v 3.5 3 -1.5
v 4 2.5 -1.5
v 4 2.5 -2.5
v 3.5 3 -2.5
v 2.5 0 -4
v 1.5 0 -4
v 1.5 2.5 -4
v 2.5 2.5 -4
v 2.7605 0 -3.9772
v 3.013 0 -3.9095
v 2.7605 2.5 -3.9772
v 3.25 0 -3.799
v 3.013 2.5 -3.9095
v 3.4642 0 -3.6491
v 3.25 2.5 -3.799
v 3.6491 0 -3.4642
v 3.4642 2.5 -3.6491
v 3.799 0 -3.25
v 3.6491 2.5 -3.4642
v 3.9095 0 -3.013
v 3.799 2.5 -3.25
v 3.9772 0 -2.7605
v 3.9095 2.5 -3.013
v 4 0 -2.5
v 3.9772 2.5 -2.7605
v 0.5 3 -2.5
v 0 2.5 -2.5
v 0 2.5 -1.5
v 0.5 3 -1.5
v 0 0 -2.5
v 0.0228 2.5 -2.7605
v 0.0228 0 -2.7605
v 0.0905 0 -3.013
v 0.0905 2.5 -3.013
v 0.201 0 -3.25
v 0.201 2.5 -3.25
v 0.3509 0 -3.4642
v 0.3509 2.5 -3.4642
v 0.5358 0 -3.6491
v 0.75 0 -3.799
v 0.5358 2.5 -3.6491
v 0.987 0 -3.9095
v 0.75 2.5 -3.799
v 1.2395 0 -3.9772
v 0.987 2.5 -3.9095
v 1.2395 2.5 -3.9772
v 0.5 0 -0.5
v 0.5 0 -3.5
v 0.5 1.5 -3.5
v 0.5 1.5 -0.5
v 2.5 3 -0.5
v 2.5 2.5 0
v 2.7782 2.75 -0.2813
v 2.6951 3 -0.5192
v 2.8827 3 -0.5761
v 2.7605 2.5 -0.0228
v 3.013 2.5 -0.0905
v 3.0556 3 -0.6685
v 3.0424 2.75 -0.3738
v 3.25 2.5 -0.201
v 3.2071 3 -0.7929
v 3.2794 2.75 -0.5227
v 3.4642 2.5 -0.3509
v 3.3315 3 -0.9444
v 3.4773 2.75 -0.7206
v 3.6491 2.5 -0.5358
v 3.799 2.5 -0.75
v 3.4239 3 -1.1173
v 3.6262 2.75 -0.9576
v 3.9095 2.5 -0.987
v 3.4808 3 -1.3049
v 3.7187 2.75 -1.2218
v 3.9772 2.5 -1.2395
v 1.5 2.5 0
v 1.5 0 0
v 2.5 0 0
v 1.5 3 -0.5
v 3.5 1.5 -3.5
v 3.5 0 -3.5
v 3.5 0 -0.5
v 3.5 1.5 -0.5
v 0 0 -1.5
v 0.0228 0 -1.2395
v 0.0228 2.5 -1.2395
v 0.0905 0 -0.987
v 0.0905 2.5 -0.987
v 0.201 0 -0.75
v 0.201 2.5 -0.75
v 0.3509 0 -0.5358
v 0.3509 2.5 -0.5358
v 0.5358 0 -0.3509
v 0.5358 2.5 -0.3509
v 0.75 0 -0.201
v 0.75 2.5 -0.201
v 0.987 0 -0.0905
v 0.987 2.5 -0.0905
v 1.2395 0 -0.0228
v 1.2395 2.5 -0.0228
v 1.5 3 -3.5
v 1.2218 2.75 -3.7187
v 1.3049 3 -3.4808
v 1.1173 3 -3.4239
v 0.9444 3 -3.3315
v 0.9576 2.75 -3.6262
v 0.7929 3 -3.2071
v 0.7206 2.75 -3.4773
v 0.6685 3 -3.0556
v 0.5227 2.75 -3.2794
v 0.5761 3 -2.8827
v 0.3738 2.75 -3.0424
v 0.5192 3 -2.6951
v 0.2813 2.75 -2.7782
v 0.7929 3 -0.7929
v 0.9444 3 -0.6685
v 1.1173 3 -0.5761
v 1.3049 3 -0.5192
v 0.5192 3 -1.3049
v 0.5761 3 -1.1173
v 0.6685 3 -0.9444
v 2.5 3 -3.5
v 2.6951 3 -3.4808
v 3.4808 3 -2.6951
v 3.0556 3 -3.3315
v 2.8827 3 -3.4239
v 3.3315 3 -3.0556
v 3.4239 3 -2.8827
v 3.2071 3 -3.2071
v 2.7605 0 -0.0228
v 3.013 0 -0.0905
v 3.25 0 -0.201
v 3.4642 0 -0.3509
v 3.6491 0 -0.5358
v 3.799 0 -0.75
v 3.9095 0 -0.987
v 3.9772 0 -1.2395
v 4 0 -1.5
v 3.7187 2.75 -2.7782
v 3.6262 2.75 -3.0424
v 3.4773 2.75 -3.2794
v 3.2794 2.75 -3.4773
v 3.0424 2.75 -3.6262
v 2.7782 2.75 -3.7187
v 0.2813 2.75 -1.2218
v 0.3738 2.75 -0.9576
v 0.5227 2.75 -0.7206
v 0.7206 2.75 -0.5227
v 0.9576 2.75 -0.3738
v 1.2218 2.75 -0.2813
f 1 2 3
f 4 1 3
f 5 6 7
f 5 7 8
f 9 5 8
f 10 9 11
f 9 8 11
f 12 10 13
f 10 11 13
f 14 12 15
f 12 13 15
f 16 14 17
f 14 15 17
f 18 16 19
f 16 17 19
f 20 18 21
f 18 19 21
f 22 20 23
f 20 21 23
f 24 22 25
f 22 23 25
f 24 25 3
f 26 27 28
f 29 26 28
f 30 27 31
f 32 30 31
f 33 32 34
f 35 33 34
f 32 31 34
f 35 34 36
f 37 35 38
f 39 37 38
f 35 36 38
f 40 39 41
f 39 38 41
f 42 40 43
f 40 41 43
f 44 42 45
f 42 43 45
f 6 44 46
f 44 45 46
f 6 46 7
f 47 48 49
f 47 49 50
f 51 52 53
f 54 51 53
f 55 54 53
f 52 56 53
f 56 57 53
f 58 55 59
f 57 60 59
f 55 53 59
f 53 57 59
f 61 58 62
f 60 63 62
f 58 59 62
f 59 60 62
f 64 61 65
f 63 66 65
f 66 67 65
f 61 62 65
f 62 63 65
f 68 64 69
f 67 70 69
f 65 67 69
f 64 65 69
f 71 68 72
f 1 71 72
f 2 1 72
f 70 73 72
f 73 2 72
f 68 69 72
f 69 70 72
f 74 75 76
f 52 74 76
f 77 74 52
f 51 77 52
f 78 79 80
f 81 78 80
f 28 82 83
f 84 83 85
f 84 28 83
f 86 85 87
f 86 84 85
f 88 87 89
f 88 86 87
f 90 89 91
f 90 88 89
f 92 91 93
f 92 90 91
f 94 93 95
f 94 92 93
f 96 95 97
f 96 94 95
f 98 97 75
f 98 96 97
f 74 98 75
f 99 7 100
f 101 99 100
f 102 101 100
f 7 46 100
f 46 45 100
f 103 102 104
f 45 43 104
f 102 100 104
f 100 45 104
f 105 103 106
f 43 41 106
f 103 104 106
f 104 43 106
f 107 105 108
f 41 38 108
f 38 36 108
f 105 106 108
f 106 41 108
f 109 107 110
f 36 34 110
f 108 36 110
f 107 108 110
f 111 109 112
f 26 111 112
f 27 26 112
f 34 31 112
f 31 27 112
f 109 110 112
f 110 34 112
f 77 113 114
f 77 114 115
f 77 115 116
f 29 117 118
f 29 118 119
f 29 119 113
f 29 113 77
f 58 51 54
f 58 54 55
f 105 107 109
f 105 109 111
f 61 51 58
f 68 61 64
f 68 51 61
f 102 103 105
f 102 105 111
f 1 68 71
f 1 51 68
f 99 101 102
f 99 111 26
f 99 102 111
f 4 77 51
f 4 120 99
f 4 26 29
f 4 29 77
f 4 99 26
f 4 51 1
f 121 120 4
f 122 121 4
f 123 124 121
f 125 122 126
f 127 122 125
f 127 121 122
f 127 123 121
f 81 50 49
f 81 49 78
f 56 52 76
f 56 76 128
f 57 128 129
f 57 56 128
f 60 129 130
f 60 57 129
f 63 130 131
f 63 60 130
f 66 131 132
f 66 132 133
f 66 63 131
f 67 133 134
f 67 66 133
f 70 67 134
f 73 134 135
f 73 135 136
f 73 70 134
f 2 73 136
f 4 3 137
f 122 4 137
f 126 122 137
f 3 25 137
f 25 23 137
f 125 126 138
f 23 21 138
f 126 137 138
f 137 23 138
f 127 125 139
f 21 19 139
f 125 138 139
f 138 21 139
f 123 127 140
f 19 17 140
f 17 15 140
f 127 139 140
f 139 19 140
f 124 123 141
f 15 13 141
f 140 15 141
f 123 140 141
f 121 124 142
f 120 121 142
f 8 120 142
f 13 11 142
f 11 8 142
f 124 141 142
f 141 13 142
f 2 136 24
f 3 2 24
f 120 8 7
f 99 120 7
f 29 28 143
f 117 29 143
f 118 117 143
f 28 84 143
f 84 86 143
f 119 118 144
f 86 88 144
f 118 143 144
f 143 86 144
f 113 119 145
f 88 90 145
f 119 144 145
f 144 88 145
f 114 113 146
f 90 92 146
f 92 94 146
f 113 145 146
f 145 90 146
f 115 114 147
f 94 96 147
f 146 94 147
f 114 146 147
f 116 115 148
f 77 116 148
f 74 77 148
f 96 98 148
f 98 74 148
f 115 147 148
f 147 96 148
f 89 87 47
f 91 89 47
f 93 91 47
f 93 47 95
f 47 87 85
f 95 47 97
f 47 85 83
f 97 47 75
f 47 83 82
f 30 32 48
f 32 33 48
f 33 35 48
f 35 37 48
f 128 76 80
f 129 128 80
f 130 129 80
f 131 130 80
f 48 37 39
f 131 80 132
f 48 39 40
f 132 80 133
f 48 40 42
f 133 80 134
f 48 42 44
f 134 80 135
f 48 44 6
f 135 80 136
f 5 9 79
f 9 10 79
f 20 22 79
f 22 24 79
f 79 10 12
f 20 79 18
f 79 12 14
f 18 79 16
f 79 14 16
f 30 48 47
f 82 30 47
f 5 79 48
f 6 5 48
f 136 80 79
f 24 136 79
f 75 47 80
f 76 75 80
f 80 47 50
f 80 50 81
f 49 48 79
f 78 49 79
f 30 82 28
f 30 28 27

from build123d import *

# Parameters (mm, degrees)
CROQUIS1_W              = 4
CROQUIS1_H              = 4
SALIENTE_EXTRUIR1_DEPTH = 3
CROQUIS2_W              = 3
CROQUIS2_H              = 3
CORTAR_EXTRUIR1_DEPTH   = 1.5
REDONDEO1_R             = 1.5
CHAFL_N1_SIZE           = 0.5


with BuildPart() as part:
    # Croquis1 → Saliente-Extruir1 (new body)
    with BuildSketch(Plane(origin=(0, 0, 0), x_dir=(1, 0, 0), z_dir=(0, 1, 0))):
        with Locations((2, 2)):
            Rectangle(CROQUIS1_W, CROQUIS1_H)
    extrude(amount=SALIENTE_EXTRUIR1_DEPTH)

    # Croquis2 → Cortar-Extruir1 (cut)
    with BuildSketch(Plane.XZ):
        with Locations((2, -2)):
            Rectangle(CROQUIS2_W, CROQUIS2_H)
    extrude(amount=-CORTAR_EXTRUIR1_DEPTH, mode=Mode.SUBTRACT)

    # Redondeo1
    redondeo1_edges = [part.edges().sort_by_distance(p)[0] for p in [
        (0, 1.5, -4),
        (4, 1.5, -4),
        (4, 1.5, 0),
        (0, 1.5, 0),
    ]]
    fillet(redondeo1_edges, radius=REDONDEO1_R)

    # Chaflán1
    chafl_n1_edges = [part.edges().sort_by_distance(p)[0] for p in [
        (2, 3, 0),
        (0, 3, -2),
        (4, 3, -2),
        (2, 3, -4),
        (3.560660172, 3, -0.439339828),
        (3.560660172, 3, -3.560660172),
        (0.439339828, 3, -3.560660172),
        (0.439339828, 3, -0.439339828),
    ]]
    chamfer(chafl_n1_edges, length=CHAFL_N1_SIZE)


solid = part.part
